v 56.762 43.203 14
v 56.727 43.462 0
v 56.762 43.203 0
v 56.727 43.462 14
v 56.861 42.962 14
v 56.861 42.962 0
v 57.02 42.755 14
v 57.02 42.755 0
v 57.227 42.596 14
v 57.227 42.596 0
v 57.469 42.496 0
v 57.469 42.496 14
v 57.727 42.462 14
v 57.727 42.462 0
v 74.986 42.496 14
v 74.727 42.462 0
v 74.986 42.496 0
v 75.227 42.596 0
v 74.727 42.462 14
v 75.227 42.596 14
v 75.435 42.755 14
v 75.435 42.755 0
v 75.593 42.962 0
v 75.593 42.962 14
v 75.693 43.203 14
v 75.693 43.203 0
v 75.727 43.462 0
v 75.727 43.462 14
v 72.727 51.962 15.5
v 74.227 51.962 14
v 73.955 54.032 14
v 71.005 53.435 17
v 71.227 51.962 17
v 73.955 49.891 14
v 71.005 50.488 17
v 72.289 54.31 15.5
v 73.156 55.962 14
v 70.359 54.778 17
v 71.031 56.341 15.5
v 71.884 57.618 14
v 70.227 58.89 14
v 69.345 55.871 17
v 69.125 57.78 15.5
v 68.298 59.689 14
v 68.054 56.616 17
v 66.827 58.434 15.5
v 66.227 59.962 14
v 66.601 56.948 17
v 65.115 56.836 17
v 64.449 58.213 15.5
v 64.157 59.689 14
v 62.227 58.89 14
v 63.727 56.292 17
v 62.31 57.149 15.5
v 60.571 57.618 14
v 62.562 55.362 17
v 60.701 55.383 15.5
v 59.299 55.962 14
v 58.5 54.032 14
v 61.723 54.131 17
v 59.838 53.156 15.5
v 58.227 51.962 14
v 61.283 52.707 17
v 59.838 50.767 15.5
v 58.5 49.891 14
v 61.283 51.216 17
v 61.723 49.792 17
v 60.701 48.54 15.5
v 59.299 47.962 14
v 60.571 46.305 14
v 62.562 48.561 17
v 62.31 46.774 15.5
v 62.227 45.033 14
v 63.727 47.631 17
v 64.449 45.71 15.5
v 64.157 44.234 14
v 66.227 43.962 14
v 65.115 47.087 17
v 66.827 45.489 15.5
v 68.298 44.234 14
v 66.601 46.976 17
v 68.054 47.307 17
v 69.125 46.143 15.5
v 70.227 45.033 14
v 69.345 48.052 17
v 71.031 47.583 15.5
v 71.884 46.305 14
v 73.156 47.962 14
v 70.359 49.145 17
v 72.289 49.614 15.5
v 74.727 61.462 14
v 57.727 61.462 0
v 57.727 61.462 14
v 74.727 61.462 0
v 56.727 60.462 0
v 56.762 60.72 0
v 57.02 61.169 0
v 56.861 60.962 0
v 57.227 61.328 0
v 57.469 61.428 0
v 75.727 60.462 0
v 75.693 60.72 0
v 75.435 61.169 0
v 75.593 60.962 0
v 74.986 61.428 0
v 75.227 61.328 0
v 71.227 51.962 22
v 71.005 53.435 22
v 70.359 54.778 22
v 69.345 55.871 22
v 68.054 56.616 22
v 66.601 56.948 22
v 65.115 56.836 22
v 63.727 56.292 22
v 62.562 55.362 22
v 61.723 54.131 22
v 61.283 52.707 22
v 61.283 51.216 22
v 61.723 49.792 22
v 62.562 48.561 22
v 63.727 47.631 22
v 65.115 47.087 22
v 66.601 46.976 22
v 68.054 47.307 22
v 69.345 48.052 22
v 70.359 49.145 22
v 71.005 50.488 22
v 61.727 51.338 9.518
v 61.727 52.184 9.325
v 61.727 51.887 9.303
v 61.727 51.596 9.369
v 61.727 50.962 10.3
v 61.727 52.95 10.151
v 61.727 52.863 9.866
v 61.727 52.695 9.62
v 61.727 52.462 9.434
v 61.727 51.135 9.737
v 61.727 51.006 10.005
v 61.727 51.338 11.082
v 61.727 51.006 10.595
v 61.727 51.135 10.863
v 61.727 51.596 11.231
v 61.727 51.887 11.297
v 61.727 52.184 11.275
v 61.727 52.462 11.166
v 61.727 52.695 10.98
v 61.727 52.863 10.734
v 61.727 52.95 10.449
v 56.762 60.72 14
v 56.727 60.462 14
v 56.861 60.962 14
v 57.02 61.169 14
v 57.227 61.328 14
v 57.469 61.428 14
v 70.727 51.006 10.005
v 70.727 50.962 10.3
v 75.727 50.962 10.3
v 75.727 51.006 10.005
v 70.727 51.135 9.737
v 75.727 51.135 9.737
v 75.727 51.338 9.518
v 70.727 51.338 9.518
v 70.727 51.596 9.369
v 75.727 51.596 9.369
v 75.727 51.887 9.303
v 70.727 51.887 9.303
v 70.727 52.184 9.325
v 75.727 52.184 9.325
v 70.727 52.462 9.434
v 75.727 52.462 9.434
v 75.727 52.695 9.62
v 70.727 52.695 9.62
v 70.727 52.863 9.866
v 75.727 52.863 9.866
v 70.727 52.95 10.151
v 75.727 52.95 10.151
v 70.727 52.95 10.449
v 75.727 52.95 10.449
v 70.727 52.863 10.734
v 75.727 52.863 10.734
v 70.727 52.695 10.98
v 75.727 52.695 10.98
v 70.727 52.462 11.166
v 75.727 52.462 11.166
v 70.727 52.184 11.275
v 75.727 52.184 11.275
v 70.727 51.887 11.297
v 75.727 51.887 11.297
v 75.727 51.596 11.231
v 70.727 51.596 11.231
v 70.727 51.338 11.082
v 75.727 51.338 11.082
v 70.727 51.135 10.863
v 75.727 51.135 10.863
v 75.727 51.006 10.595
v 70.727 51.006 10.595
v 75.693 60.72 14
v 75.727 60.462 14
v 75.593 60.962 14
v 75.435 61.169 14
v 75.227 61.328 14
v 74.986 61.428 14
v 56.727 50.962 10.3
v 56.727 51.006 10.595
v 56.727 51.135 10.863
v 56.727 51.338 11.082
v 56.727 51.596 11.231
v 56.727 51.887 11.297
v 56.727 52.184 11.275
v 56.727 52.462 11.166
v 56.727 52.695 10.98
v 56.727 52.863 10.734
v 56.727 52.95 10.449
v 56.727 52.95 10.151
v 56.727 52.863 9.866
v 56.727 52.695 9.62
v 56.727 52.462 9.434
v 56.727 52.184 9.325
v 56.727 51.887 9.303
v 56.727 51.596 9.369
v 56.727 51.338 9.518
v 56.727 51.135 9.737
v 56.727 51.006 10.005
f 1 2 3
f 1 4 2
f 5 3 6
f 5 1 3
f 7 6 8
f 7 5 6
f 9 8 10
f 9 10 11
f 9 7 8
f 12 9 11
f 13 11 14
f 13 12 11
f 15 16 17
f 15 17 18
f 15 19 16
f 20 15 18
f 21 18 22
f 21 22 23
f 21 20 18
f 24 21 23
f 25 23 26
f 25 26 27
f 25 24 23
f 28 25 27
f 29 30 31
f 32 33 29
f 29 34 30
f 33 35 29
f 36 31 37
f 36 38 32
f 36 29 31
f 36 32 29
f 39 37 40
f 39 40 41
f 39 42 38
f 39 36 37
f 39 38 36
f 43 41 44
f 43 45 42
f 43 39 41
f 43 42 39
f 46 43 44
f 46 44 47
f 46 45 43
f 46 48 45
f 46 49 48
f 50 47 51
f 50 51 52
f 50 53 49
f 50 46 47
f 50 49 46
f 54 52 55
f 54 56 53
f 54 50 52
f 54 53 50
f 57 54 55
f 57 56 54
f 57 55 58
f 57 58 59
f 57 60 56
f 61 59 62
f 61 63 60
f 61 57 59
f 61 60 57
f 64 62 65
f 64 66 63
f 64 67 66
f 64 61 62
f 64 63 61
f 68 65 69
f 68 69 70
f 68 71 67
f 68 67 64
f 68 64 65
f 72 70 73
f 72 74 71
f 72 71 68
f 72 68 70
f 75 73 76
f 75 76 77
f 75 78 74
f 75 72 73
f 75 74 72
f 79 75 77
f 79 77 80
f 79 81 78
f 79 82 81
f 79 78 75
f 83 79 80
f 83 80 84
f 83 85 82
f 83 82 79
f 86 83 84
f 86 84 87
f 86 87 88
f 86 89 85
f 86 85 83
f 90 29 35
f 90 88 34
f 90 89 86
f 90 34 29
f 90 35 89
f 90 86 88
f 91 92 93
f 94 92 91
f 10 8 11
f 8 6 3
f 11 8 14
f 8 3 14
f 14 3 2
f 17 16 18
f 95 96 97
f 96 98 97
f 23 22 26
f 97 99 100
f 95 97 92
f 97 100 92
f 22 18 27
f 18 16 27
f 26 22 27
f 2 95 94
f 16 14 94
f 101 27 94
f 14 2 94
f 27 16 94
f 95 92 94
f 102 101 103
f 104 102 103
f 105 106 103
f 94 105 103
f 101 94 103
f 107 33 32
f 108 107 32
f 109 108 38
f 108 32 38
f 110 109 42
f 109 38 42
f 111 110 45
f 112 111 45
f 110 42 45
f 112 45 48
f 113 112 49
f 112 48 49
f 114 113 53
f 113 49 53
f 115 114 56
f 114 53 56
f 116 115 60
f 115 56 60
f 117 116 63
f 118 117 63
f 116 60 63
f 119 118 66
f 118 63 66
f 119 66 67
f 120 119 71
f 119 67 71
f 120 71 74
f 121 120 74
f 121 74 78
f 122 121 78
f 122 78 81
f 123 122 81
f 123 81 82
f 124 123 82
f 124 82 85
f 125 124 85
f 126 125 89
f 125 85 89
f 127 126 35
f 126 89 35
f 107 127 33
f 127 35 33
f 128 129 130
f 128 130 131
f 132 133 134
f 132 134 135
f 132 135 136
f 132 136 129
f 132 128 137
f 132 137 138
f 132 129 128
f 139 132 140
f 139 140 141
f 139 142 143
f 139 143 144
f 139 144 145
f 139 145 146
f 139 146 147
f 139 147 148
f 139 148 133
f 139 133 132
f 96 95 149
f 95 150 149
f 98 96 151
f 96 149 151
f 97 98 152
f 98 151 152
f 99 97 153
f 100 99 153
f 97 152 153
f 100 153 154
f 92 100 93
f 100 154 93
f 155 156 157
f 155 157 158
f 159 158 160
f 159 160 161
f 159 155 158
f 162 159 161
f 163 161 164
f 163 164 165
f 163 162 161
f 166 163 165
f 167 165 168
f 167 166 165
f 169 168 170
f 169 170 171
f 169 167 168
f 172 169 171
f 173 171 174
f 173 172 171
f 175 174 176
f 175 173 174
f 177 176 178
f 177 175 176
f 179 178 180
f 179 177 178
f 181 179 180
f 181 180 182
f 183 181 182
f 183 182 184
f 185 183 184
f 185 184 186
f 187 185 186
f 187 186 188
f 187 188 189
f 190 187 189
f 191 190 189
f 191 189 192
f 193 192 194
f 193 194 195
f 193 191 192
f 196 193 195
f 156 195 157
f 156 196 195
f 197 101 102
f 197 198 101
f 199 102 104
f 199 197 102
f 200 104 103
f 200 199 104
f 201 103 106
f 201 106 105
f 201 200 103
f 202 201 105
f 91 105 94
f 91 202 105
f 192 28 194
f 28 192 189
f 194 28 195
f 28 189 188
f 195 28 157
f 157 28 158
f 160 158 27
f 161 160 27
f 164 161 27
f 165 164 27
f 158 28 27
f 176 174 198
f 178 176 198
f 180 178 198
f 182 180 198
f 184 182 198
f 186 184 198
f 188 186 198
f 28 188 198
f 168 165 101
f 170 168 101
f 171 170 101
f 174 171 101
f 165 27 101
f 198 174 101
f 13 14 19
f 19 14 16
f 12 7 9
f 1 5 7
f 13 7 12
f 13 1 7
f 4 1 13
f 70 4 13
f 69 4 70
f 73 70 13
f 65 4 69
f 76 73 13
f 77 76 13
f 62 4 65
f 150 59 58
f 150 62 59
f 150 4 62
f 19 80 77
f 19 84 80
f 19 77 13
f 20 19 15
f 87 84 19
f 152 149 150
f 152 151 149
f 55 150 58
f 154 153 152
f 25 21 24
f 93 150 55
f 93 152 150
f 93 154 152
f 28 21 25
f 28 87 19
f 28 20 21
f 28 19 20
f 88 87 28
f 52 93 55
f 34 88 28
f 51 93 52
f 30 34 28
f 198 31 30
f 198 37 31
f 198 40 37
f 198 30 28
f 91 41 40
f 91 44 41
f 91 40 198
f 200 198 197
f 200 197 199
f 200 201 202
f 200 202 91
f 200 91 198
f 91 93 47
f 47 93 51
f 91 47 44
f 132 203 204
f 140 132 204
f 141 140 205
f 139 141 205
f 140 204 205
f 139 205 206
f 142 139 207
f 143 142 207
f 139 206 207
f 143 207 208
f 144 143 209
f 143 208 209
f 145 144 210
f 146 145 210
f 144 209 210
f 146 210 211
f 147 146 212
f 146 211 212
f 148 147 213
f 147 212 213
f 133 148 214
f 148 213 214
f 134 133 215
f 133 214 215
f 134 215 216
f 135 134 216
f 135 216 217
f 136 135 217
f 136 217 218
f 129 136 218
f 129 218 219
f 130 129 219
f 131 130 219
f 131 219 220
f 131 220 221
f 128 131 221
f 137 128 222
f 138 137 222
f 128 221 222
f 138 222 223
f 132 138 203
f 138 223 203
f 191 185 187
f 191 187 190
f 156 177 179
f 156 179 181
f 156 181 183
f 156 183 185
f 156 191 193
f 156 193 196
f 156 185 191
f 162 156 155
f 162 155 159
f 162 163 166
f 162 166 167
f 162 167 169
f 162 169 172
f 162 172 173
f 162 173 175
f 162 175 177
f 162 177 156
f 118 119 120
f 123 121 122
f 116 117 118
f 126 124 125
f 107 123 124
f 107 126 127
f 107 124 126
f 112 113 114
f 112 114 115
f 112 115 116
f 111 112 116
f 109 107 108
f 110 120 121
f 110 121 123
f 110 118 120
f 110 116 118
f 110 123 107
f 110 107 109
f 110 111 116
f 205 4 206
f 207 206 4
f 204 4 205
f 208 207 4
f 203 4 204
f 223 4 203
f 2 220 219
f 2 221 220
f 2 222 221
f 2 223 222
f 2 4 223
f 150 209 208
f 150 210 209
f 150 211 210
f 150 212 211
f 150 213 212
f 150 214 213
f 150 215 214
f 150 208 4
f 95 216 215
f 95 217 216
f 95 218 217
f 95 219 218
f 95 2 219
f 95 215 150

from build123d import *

# Parameters (mm, degrees)
SKETCH1_W           = 19
SKETCH1_H           = 19
BOSS_EXTRUDE1_DEPTH = 14
FILLET1_R           = 1
SKETCH2_R           = 5
BOSS_EXTRUDE2_DEPTH = 8
CHAMFER1_SIZE       = 3
SKETCH3_R           = 1
CUT_EXTRUDE1_DEPTH  = 5
CUT_EXTRUDE2_START  = -5
SKETCH4_R           = 1
CUT_EXTRUDE2_DEPTH  = 5


with BuildPart() as part:
    # Sketch1 → Boss-Extrude1 (new body)
    with BuildSketch(Plane.XY):
        with Locations((66.227433771, 51.961607523)):
            Rectangle(SKETCH1_W, SKETCH1_H)
    extrude(amount=BOSS_EXTRUDE1_DEPTH)

    # Fillet1
    fillet1_edges = [part.edges().sort_by_distance(p)[0] for p in [
        (56.727433771, 61.461607523, 7),
        (75.727433771, 61.461607523, 7),
        (75.727433771, 42.461607523, 7),
        (56.727433771, 42.461607523, 7),
    ]]
    fillet(fillet1_edges, radius=FILLET1_R)

    # Sketch2 → Boss-Extrude2 (add)
    with BuildSketch(Plane.XY.offset(14)):
        with Locations((66.227433771, 51.961607523)):
            Circle(SKETCH2_R)
    extrude(amount=BOSS_EXTRUDE2_DEPTH)

    # Chamfer1
    chamfer1_edges = [part.edges().sort_by_distance(p)[0] for p in [
        (61.227433771, 51.961607523, 14),
    ]]
    chamfer(chamfer1_edges, length=CHAMFER1_SIZE)

    # Sketch3 → Cut-Extrude1 (cut)
    with BuildSketch(Plane.ZY.offset(-56.727433771)):
        with Locations(Location((10.3, 51.961607523, 0), (0, 0, 270))):
            Circle(SKETCH3_R)
    extrude(amount=-CUT_EXTRUDE1_DEPTH, mode=Mode.SUBTRACT)

    # Sketch4 → Cut-Extrude2 (cut)
    with BuildSketch(Plane(origin=(75.727433771, 0, 0), x_dir=(0, 0, -1), z_dir=(1, 0, 0)).offset(CUT_EXTRUDE2_START)):
        with Locations(Location((-10.3, 51.961607523, 0), (0, 0, 270))):
            Circle(SKETCH4_R)
    extrude(amount=CUT_EXTRUDE2_DEPTH, mode=Mode.SUBTRACT)


solid = part.part
